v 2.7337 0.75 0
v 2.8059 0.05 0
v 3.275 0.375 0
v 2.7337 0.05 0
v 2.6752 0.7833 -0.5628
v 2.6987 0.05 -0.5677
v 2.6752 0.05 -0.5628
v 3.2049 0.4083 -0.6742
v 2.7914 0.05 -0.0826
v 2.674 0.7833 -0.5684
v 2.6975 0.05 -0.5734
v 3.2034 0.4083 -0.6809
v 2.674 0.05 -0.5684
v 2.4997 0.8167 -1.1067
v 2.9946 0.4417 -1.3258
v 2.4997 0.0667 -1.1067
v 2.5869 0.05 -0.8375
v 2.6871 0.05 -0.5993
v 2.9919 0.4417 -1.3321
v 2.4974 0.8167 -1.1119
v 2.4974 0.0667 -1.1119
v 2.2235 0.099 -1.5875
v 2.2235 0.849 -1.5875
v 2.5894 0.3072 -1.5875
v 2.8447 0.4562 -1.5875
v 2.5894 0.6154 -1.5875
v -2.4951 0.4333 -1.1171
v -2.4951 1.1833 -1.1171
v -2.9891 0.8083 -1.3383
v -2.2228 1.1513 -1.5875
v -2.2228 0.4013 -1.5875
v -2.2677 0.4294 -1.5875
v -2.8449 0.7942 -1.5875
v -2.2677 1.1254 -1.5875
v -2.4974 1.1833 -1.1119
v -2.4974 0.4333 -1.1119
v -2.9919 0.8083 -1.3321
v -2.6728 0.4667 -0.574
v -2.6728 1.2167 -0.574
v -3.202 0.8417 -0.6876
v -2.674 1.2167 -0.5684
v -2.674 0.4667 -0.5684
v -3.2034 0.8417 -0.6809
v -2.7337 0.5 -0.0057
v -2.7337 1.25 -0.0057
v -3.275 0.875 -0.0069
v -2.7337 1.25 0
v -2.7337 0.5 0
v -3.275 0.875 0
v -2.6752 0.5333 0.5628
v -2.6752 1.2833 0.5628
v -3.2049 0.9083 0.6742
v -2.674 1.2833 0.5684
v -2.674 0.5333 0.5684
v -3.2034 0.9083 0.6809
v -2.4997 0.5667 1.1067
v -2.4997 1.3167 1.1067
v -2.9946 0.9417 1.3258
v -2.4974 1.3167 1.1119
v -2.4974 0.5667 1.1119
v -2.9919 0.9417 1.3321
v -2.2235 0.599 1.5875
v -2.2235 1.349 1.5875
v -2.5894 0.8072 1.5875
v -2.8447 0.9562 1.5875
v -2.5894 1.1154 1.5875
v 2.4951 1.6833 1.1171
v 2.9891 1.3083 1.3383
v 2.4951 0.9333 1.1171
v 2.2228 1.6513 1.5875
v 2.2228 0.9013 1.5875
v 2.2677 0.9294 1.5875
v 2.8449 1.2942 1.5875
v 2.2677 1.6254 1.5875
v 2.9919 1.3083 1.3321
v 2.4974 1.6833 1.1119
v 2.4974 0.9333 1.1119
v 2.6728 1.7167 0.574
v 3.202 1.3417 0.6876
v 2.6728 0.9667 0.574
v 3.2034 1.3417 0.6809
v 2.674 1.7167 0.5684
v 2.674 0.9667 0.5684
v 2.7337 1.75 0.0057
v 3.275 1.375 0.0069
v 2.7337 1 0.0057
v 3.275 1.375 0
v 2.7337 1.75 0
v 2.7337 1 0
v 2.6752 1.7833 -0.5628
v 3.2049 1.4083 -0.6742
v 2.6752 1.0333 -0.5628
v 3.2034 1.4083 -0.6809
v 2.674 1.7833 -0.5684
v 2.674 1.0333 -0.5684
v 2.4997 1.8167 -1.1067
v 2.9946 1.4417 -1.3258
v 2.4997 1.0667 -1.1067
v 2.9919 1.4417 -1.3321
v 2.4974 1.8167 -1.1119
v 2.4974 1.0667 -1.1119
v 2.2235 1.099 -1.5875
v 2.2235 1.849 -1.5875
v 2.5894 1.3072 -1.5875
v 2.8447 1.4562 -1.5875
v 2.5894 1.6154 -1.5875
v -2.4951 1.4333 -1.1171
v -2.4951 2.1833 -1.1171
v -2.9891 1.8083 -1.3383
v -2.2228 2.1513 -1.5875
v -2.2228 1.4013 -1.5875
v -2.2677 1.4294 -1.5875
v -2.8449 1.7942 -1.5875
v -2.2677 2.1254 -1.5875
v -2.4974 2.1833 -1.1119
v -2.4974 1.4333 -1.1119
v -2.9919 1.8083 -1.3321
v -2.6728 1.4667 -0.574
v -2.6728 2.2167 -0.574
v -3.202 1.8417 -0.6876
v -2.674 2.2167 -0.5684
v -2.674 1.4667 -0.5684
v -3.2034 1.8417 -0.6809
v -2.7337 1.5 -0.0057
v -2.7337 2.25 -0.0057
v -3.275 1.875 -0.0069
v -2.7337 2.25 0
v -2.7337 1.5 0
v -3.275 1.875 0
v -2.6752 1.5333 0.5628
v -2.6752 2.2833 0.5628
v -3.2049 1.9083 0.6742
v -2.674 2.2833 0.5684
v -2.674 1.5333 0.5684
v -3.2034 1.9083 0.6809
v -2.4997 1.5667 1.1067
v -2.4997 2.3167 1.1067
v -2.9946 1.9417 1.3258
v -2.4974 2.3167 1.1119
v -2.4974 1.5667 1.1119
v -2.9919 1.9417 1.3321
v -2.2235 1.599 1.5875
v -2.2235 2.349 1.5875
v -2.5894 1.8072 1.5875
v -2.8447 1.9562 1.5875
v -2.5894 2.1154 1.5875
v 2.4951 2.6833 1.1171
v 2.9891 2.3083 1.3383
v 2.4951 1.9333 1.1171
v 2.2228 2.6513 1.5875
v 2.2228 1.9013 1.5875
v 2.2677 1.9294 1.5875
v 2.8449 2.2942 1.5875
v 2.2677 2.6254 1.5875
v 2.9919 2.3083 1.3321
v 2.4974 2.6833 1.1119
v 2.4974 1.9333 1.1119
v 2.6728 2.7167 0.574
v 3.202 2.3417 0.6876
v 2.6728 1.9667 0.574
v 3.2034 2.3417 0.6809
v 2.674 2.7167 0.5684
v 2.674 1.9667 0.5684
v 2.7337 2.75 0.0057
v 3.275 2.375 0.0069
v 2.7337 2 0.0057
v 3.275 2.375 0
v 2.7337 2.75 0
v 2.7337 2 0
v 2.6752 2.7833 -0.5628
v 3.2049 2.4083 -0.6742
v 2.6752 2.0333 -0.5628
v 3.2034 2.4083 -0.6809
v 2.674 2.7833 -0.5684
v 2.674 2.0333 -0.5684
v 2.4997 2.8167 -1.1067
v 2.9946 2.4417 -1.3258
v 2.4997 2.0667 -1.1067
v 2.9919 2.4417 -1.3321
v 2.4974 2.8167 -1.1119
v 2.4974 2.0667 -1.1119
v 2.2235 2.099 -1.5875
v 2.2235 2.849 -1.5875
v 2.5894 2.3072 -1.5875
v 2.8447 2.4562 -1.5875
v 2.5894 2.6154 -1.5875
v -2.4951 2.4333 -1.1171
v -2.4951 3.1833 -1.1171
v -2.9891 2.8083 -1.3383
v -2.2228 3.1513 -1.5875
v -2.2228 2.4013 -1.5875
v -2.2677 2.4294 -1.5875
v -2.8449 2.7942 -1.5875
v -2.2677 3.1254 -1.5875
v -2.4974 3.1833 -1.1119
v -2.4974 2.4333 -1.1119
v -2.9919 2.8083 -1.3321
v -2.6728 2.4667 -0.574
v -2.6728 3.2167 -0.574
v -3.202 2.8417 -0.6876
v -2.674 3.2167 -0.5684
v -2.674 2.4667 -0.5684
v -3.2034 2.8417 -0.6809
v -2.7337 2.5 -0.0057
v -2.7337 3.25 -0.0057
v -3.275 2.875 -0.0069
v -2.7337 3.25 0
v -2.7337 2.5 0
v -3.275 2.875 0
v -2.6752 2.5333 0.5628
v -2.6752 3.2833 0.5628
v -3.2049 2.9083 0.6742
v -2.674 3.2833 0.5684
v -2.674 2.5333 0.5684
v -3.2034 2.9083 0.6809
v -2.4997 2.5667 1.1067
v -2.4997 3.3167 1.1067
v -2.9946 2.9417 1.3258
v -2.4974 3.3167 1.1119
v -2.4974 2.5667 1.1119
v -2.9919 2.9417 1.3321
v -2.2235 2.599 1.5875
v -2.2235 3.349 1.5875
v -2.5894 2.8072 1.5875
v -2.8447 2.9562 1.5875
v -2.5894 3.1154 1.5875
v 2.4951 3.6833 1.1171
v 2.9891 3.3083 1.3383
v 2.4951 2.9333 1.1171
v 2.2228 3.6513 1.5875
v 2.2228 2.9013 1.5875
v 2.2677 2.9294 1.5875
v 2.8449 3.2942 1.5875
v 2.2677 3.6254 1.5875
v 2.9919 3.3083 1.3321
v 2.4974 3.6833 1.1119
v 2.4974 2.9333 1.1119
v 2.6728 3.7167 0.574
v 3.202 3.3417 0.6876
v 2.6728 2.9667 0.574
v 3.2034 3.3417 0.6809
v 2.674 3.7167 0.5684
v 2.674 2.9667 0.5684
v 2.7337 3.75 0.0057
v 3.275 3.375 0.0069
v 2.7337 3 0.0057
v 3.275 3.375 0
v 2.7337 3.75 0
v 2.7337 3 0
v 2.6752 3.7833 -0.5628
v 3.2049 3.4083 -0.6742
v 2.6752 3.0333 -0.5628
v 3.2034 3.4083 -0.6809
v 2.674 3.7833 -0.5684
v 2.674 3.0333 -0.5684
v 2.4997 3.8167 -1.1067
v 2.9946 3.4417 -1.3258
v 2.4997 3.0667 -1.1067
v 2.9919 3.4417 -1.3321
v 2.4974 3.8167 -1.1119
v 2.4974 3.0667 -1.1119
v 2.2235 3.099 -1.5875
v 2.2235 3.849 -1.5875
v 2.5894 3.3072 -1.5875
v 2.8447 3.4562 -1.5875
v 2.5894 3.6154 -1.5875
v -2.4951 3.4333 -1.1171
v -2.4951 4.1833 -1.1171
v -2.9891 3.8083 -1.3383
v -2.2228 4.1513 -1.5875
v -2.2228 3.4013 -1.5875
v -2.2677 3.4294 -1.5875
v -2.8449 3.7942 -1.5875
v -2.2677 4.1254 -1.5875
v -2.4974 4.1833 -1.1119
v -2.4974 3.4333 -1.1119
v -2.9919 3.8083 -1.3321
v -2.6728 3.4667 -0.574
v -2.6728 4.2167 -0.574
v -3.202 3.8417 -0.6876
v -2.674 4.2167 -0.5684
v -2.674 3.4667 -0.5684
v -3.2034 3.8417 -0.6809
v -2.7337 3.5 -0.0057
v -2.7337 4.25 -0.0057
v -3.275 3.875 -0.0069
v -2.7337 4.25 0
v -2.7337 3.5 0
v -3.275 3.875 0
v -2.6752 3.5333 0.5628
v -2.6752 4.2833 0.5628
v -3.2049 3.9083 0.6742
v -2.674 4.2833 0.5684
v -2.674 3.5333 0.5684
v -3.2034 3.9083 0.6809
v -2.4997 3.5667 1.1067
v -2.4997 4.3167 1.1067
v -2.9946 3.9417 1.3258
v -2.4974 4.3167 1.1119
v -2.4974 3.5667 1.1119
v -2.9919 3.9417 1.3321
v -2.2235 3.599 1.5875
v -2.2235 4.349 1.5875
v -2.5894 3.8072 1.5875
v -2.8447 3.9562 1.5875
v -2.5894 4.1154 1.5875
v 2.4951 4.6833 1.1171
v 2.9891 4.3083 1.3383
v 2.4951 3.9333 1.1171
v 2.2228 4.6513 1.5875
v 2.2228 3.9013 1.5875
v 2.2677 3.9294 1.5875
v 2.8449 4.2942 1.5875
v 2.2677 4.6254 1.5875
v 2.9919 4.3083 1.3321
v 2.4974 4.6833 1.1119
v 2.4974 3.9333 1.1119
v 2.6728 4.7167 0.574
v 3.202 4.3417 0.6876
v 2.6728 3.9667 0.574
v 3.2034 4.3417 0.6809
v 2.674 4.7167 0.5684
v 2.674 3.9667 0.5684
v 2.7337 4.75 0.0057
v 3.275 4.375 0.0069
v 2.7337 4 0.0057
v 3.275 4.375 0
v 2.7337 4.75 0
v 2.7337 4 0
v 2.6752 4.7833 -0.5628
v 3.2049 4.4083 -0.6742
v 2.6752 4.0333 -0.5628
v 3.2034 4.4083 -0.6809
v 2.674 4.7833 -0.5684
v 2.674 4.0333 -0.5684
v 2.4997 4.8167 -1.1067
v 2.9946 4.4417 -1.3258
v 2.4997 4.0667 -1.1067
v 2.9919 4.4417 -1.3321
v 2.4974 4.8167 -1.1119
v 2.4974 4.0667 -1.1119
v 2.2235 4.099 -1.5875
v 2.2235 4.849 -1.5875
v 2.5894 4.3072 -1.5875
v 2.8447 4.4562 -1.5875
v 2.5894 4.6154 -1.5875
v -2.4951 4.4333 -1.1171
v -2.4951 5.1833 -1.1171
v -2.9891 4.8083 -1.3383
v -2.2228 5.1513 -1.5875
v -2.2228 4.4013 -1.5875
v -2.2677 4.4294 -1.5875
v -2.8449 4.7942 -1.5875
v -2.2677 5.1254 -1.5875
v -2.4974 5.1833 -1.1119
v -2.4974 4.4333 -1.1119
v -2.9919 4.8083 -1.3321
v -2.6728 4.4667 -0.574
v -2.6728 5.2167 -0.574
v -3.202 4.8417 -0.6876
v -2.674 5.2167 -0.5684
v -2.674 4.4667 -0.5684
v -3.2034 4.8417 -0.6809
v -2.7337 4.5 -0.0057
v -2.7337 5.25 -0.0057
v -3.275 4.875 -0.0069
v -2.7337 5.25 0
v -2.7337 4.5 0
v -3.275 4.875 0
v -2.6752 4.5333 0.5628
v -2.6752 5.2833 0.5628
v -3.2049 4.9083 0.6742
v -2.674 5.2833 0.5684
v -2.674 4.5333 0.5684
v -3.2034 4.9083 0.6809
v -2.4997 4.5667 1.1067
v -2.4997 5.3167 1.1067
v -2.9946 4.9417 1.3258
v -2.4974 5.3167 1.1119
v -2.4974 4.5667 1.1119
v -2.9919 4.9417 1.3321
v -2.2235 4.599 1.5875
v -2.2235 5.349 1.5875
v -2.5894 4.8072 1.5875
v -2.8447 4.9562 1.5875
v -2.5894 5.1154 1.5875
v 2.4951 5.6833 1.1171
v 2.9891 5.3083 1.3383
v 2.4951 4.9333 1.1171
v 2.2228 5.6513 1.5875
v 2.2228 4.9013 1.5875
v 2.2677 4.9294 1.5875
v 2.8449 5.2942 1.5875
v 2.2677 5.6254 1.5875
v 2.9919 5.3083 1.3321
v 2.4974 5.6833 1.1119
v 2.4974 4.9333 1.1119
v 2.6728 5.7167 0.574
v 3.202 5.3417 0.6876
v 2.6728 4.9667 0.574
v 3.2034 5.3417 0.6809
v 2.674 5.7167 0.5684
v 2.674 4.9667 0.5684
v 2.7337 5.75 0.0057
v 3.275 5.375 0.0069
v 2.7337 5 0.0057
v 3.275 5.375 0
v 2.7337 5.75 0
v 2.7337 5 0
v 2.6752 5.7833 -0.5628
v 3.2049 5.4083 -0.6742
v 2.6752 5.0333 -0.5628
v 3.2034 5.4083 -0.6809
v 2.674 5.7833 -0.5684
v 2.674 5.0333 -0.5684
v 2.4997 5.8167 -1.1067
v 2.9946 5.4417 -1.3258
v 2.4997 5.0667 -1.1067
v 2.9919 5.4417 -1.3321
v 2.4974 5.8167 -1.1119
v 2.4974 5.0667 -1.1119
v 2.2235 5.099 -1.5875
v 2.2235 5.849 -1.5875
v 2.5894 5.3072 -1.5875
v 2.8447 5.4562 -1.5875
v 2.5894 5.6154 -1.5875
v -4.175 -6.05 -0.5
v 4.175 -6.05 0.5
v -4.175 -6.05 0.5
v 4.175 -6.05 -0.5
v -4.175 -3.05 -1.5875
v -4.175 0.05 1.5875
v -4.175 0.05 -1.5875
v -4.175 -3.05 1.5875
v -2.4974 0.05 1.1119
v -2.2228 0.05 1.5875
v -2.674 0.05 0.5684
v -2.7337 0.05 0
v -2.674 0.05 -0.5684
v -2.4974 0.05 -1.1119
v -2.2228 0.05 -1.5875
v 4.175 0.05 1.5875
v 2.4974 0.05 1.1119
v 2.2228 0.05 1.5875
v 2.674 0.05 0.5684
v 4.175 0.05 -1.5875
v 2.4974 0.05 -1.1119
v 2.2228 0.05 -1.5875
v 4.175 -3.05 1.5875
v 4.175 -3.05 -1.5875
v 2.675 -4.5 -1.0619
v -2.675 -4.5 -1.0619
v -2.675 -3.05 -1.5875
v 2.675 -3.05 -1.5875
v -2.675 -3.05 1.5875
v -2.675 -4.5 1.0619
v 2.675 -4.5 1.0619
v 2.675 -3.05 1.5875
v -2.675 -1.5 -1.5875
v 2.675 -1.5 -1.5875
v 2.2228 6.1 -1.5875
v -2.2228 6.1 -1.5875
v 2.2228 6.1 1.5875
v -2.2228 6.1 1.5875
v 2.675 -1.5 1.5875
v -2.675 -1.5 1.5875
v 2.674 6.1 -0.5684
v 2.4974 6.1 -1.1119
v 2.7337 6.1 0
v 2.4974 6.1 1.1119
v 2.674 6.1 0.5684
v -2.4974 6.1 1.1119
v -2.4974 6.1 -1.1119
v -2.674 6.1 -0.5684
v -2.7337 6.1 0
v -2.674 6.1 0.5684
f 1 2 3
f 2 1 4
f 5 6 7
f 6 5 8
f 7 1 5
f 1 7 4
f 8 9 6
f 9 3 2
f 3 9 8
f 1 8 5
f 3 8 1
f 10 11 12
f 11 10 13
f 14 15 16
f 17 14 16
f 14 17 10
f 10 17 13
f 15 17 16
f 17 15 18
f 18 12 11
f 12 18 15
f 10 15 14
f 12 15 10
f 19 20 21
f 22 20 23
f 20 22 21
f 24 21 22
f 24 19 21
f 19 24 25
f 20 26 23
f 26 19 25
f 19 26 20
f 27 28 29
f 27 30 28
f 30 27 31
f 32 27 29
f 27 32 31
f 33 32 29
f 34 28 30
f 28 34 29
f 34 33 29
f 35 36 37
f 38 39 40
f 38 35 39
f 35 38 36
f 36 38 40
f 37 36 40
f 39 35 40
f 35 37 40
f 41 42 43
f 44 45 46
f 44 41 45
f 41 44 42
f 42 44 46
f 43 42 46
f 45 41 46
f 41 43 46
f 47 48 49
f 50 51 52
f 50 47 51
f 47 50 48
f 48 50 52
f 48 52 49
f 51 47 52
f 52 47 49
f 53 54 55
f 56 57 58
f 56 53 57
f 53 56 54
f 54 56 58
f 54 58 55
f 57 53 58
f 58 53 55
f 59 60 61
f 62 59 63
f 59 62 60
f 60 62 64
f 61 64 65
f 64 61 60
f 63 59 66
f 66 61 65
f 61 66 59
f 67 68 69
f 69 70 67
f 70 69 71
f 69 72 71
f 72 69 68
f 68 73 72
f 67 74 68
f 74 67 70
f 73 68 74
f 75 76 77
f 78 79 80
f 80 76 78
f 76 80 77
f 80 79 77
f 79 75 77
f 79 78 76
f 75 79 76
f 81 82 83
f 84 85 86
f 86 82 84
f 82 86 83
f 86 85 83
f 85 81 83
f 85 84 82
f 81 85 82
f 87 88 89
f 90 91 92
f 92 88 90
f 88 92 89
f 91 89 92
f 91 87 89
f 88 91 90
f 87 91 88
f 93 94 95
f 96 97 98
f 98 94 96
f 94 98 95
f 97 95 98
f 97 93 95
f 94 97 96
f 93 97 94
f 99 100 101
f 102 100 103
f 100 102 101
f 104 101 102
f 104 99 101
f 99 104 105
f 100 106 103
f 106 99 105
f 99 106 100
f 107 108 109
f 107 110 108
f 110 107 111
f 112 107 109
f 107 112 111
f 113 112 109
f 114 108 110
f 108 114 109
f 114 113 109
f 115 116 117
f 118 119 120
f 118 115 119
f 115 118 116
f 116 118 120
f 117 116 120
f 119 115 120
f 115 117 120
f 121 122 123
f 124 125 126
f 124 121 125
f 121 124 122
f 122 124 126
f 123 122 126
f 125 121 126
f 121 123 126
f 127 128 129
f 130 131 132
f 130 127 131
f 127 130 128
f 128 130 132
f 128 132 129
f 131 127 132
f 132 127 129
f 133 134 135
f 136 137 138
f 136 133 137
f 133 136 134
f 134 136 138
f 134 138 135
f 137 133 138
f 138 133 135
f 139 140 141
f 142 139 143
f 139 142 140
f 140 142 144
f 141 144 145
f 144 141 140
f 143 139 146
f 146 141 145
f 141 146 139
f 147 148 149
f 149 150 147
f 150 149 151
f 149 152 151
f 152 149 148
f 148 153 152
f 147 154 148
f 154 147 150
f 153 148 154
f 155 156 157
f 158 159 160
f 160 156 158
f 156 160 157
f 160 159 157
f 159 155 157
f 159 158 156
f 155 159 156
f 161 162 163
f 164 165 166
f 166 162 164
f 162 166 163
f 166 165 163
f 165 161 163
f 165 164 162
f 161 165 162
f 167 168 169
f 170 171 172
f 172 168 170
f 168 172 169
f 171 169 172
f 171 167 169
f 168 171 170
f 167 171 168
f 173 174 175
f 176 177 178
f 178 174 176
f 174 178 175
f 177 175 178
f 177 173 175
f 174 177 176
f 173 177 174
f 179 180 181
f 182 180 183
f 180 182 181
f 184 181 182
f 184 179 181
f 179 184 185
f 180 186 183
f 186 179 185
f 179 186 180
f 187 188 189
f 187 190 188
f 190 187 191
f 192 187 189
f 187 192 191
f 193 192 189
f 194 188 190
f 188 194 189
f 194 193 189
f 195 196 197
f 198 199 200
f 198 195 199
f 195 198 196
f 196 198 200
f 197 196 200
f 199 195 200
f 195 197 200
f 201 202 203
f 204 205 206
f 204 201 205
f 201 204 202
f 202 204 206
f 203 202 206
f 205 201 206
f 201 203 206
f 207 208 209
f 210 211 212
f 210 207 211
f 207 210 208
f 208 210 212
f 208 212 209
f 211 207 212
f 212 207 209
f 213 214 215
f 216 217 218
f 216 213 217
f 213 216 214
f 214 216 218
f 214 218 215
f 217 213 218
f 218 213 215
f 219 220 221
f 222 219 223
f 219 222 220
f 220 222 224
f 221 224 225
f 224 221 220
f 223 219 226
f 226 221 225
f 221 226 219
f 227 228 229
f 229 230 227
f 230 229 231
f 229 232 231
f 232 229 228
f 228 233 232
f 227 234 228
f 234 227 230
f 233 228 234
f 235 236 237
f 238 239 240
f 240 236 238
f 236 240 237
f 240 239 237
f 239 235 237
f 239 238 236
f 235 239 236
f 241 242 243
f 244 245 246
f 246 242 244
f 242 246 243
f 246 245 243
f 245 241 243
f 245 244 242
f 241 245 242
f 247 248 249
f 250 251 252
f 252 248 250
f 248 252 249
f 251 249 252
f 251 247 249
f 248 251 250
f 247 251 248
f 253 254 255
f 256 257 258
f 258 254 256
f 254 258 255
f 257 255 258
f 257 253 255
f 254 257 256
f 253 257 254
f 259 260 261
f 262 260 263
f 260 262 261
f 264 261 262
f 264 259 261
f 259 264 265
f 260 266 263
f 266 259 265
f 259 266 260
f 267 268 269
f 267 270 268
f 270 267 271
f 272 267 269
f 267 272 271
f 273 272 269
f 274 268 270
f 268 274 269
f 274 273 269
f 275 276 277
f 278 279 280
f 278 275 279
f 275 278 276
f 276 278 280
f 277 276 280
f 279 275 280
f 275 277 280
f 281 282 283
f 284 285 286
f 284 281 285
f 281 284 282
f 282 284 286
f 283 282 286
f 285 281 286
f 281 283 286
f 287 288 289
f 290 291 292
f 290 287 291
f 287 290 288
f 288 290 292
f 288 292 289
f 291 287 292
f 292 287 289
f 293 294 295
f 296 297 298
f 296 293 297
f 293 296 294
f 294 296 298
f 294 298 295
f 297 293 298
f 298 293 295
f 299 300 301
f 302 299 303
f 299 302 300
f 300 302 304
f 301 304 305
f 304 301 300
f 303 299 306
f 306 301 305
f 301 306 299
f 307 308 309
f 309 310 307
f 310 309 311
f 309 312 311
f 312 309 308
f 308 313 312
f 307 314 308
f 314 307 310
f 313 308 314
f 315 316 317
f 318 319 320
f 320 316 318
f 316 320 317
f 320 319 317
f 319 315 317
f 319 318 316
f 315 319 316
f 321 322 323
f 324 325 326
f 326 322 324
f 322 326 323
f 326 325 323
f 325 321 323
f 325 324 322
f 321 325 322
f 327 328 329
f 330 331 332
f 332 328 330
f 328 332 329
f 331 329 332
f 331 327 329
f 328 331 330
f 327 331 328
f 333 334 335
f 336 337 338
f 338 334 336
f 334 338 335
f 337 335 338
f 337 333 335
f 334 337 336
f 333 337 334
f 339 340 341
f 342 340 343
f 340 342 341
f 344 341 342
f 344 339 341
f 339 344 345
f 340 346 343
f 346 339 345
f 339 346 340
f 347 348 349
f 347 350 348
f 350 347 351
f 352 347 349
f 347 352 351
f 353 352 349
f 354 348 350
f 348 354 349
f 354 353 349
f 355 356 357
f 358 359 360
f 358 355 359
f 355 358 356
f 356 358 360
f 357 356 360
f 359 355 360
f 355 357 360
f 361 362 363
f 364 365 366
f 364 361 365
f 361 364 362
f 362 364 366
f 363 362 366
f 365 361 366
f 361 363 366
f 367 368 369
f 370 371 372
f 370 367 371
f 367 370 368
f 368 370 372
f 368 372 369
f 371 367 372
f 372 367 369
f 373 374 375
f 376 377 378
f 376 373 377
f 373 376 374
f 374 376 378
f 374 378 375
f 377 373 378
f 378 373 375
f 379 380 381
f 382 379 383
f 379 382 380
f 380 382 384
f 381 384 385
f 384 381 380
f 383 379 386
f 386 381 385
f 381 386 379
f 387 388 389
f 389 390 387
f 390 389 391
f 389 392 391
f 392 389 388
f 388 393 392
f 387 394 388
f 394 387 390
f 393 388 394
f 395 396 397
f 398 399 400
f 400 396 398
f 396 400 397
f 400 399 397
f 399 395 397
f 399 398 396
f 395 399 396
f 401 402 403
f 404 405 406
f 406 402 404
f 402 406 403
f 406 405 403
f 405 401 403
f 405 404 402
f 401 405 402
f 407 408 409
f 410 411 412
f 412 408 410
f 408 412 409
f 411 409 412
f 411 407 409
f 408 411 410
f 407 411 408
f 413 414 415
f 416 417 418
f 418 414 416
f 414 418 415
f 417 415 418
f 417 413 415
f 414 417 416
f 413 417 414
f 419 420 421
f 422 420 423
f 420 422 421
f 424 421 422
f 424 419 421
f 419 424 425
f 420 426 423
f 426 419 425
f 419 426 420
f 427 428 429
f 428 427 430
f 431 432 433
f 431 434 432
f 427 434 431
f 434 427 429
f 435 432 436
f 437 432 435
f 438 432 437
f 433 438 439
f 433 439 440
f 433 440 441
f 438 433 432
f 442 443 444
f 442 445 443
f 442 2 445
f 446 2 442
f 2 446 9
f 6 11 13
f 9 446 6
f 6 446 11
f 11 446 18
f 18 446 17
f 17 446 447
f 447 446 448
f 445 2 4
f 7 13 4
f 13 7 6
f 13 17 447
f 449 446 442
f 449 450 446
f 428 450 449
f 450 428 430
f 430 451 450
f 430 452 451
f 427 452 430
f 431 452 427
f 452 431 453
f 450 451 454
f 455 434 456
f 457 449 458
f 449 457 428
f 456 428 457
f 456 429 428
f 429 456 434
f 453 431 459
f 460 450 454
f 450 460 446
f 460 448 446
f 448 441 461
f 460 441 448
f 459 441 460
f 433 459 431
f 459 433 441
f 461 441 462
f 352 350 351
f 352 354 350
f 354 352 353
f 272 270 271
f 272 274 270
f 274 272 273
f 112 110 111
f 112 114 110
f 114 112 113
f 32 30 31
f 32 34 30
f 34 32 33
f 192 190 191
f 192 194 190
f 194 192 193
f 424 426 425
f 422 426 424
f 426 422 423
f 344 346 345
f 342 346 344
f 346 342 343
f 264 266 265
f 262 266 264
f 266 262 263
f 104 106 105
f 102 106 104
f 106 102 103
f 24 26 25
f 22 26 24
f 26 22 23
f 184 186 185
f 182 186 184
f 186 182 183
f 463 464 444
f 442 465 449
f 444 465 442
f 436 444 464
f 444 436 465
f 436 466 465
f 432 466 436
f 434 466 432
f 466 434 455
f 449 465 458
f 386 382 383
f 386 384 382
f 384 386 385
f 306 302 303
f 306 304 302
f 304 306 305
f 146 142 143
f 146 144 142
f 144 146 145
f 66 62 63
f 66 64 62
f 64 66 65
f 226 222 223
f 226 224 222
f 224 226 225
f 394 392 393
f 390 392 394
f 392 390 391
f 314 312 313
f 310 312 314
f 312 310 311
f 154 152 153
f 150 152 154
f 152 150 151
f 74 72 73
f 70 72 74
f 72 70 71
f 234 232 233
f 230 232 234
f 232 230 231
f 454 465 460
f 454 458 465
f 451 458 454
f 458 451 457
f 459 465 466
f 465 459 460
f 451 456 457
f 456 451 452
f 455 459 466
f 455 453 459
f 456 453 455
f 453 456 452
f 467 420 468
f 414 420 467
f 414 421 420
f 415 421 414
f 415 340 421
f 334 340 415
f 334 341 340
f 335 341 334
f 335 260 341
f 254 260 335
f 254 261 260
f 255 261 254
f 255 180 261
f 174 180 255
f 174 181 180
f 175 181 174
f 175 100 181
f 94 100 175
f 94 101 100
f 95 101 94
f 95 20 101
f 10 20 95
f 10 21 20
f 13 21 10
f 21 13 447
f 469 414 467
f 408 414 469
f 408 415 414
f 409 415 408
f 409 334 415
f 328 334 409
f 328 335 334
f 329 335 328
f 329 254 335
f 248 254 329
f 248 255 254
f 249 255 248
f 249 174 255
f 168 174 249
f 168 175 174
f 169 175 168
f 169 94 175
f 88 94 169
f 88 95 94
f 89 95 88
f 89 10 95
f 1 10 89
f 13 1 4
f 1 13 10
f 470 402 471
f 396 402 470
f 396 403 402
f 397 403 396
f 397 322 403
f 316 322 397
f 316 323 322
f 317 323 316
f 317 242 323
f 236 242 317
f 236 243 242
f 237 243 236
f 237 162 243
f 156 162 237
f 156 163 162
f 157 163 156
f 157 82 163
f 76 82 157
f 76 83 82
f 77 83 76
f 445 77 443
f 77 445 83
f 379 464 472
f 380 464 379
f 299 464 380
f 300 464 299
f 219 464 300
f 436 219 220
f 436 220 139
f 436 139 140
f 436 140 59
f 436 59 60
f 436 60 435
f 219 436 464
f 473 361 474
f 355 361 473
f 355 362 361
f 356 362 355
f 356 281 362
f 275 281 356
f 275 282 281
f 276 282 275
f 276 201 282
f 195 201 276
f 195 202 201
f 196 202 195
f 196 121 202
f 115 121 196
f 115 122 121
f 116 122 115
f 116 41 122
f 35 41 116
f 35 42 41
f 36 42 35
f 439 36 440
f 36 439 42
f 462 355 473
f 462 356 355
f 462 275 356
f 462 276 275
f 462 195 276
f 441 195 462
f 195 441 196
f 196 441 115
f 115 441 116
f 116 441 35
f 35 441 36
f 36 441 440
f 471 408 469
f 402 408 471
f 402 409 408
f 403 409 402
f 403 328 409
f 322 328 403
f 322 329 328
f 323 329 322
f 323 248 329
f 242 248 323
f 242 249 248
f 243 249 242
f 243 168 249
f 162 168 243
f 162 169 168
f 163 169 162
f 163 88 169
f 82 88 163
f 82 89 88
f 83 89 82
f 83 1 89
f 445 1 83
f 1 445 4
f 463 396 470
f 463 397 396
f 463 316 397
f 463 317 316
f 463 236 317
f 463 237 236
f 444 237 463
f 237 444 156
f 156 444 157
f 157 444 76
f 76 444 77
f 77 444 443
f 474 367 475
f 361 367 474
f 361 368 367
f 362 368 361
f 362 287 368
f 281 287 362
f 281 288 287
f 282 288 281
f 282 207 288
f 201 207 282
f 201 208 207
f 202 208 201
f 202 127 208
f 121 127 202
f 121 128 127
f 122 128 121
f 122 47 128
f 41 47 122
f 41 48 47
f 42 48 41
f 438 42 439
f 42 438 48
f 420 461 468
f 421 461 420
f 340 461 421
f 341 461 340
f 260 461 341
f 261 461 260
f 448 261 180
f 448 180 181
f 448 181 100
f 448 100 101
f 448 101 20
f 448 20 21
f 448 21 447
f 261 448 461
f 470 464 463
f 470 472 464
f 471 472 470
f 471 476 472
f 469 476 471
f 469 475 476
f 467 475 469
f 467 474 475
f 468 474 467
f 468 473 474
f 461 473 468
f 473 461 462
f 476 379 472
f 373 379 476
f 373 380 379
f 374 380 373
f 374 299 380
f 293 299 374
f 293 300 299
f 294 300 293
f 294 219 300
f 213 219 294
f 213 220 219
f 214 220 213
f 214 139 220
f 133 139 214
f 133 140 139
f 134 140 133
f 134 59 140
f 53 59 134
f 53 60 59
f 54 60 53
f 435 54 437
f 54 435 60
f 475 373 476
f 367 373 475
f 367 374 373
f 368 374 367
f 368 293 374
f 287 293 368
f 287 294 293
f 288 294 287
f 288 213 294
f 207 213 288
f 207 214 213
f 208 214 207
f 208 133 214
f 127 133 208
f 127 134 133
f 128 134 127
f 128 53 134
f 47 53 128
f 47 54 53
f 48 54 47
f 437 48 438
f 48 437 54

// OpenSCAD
use <lib/ISOThread.scad>
// Tiny but hard to twist

// Typical camera mounts are 3/4 inch or 1/4 inch
screwDia=6.35; // 6.35mm == 1/4 inch
screwLen=6;

flagHead=6;

layerHeight=0.3;

rotate([-90,0,0])
intersection()
{
    screwFlatCut=screwDia/2;
    union()
    {
         // Screw
        thread_out(screwDia,screwLen+0.1);
        thread_out_centre(screwDia+0.2,screwLen+0.1);
        difference()
        {
            headWidth=screwDia+2;
            // Head
            hull()
            {
                cube([headWidth,screwFlatCut,0.1], center=true);
                translate([0,0,-flagHead/2])
                    cube([headWidth,screwFlatCut,0.1], center=true);
                translate([0,0,-flagHead])
                    cube([headWidth,1,0.1], center=true);
            }
            translate([0,0,-flagHead/2])
                cube([headWidth-3,screwFlatCut+1,flagHead-3], center=true);
        }

        // Brim for more reliable printing
        if (0)
        hull()
        {
            translate([0,screwFlatCut/2,screwLen])
                cube([1,layerHeight*2+0.1,0.01], center=true);
            translate([0,screwFlatCut/2,screwLen+10])
                cube([3,layerHeight*2+0.1,0.01], center=true);
        }
        if (0)
        hull()
        {
            translate([0,screwFlatCut/2,0])
                cube([1,layerHeight*2+0.1,0.01], center=true);
            translate([0,screwFlatCut/2,-10])
                cube([3,layerHeight*2+0.1,0.01], center=true);
        }
    }

    // Cut for ease of printing
    cube([screwDia*2, screwFlatCut, screwLen*3+10], center=true);
}
